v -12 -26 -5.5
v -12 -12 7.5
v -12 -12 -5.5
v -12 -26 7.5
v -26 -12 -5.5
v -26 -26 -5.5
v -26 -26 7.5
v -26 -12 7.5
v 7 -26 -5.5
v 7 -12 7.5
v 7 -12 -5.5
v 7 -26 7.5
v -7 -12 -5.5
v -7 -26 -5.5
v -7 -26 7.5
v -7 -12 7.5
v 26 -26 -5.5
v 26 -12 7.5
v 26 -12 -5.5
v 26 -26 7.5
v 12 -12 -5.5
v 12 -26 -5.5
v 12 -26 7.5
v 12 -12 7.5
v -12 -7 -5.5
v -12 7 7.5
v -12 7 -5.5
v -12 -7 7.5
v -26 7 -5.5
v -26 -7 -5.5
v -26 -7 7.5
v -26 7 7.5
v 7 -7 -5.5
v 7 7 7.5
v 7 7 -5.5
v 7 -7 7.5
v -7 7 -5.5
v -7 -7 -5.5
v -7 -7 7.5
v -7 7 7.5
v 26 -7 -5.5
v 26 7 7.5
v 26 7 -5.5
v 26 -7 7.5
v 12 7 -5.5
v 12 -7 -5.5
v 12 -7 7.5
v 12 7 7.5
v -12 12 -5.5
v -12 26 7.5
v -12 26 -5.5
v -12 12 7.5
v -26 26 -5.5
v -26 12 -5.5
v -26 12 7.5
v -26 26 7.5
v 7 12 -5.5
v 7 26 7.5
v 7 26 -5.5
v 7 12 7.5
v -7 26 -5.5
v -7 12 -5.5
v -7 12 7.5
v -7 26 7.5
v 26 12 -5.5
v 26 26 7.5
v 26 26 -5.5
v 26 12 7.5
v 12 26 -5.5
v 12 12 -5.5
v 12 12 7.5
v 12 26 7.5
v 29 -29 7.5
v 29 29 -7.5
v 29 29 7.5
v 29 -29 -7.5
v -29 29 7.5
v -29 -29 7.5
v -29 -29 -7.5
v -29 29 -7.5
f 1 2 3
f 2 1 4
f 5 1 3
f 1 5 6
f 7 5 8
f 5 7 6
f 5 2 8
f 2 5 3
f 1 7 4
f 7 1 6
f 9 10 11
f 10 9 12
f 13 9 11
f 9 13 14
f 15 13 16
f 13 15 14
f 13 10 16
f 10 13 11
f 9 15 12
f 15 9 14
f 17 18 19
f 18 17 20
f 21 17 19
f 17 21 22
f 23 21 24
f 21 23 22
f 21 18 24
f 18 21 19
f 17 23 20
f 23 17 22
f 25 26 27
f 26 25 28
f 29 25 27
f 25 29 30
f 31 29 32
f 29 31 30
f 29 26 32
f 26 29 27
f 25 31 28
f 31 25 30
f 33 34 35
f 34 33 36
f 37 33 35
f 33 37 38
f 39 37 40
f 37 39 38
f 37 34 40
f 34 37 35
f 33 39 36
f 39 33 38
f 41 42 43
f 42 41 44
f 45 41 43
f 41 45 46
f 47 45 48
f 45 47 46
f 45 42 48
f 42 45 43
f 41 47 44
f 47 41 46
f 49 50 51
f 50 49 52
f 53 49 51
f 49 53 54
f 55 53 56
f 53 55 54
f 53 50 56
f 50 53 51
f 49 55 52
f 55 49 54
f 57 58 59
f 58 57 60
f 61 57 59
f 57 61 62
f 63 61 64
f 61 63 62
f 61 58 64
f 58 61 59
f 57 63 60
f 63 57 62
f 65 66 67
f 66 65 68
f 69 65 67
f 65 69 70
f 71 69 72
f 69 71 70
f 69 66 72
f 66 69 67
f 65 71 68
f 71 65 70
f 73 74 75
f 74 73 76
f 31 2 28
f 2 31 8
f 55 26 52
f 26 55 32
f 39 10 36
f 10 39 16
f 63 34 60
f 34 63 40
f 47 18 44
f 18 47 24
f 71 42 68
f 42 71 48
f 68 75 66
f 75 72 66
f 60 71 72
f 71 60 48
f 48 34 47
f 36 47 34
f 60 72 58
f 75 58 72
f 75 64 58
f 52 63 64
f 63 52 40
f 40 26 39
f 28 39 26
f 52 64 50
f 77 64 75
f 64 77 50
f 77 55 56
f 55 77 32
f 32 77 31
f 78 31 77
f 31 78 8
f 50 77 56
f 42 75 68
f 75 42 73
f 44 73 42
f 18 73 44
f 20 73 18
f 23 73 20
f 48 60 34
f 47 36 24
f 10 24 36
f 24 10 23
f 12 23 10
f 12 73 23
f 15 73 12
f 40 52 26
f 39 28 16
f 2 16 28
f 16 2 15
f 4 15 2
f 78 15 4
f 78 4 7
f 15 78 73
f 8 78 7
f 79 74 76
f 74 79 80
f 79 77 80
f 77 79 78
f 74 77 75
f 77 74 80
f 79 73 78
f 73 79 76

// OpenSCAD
$fn = 32;

// ----------------------------------------------------------------------
// Pocket plate 58 x 58 x 15
// 3 x 3 pockets 14 mm square, 13 mm deep
// ----------------------------------------------------------------------

// --- parameters (mm) ---
thickness = 15;  // plate thickness
floor_t = 2;     // material left under each pocket
pocket = 14;     // pocket side length
pitch_x = 19;    // pocket pitch along X
pitch_y = 19;    // pocket pitch along Y
cols = 3;        // pockets per row
rows = 3;        // rows of pockets

// --- derived feature positions (mm) ---
depth = thickness - floor_t;        // = 13   pocket depth, down to the floor
span_x = (cols - 1) * pitch_x;      // = 38   distance between outer pockets
span_y = (rows - 1) * pitch_y;      // = 38   distance between outer pocket rows
origin_x = -span_x / 2;             // = -19   X of the first pocket
origin_y = -span_y / 2;             // = -19   Y of the first pocket
plate = [span_x + pocket + 6, span_y + pocket + 6, thickness];  // = [58, 58, 15]   overall size: pockets plus 3 mm of wall on each side
feature_centers = [
  [origin_x + 0 * pitch_x, origin_y + 0 * pitch_y],
  [origin_x + 1 * pitch_x, origin_y + 0 * pitch_y],
  [origin_x + 2 * pitch_x, origin_y + 0 * pitch_y],
  [origin_x + 0 * pitch_x, origin_y + 1 * pitch_y],
  [origin_x + 1 * pitch_x, origin_y + 1 * pitch_y],
  [origin_x + 2 * pitch_x, origin_y + 1 * pitch_y],
  [origin_x + 0 * pitch_x, origin_y + 2 * pitch_y],
  [origin_x + 1 * pitch_x, origin_y + 2 * pitch_y],
  [origin_x + 2 * pitch_x, origin_y + 2 * pitch_y]
];   // pocket centres, used verbatim by the cutter loop

// plate outline, then one pocket per centre in feature_centers
difference() {
  cube(plate, center = true);
  for (centre = feature_centers)
    translate([centre[0] - pocket / 2, centre[1] - pocket / 2, plate[2] / 2 - depth])
      cube([pocket, pocket, depth + 1]);  // centred on the declared pocket centre
}
